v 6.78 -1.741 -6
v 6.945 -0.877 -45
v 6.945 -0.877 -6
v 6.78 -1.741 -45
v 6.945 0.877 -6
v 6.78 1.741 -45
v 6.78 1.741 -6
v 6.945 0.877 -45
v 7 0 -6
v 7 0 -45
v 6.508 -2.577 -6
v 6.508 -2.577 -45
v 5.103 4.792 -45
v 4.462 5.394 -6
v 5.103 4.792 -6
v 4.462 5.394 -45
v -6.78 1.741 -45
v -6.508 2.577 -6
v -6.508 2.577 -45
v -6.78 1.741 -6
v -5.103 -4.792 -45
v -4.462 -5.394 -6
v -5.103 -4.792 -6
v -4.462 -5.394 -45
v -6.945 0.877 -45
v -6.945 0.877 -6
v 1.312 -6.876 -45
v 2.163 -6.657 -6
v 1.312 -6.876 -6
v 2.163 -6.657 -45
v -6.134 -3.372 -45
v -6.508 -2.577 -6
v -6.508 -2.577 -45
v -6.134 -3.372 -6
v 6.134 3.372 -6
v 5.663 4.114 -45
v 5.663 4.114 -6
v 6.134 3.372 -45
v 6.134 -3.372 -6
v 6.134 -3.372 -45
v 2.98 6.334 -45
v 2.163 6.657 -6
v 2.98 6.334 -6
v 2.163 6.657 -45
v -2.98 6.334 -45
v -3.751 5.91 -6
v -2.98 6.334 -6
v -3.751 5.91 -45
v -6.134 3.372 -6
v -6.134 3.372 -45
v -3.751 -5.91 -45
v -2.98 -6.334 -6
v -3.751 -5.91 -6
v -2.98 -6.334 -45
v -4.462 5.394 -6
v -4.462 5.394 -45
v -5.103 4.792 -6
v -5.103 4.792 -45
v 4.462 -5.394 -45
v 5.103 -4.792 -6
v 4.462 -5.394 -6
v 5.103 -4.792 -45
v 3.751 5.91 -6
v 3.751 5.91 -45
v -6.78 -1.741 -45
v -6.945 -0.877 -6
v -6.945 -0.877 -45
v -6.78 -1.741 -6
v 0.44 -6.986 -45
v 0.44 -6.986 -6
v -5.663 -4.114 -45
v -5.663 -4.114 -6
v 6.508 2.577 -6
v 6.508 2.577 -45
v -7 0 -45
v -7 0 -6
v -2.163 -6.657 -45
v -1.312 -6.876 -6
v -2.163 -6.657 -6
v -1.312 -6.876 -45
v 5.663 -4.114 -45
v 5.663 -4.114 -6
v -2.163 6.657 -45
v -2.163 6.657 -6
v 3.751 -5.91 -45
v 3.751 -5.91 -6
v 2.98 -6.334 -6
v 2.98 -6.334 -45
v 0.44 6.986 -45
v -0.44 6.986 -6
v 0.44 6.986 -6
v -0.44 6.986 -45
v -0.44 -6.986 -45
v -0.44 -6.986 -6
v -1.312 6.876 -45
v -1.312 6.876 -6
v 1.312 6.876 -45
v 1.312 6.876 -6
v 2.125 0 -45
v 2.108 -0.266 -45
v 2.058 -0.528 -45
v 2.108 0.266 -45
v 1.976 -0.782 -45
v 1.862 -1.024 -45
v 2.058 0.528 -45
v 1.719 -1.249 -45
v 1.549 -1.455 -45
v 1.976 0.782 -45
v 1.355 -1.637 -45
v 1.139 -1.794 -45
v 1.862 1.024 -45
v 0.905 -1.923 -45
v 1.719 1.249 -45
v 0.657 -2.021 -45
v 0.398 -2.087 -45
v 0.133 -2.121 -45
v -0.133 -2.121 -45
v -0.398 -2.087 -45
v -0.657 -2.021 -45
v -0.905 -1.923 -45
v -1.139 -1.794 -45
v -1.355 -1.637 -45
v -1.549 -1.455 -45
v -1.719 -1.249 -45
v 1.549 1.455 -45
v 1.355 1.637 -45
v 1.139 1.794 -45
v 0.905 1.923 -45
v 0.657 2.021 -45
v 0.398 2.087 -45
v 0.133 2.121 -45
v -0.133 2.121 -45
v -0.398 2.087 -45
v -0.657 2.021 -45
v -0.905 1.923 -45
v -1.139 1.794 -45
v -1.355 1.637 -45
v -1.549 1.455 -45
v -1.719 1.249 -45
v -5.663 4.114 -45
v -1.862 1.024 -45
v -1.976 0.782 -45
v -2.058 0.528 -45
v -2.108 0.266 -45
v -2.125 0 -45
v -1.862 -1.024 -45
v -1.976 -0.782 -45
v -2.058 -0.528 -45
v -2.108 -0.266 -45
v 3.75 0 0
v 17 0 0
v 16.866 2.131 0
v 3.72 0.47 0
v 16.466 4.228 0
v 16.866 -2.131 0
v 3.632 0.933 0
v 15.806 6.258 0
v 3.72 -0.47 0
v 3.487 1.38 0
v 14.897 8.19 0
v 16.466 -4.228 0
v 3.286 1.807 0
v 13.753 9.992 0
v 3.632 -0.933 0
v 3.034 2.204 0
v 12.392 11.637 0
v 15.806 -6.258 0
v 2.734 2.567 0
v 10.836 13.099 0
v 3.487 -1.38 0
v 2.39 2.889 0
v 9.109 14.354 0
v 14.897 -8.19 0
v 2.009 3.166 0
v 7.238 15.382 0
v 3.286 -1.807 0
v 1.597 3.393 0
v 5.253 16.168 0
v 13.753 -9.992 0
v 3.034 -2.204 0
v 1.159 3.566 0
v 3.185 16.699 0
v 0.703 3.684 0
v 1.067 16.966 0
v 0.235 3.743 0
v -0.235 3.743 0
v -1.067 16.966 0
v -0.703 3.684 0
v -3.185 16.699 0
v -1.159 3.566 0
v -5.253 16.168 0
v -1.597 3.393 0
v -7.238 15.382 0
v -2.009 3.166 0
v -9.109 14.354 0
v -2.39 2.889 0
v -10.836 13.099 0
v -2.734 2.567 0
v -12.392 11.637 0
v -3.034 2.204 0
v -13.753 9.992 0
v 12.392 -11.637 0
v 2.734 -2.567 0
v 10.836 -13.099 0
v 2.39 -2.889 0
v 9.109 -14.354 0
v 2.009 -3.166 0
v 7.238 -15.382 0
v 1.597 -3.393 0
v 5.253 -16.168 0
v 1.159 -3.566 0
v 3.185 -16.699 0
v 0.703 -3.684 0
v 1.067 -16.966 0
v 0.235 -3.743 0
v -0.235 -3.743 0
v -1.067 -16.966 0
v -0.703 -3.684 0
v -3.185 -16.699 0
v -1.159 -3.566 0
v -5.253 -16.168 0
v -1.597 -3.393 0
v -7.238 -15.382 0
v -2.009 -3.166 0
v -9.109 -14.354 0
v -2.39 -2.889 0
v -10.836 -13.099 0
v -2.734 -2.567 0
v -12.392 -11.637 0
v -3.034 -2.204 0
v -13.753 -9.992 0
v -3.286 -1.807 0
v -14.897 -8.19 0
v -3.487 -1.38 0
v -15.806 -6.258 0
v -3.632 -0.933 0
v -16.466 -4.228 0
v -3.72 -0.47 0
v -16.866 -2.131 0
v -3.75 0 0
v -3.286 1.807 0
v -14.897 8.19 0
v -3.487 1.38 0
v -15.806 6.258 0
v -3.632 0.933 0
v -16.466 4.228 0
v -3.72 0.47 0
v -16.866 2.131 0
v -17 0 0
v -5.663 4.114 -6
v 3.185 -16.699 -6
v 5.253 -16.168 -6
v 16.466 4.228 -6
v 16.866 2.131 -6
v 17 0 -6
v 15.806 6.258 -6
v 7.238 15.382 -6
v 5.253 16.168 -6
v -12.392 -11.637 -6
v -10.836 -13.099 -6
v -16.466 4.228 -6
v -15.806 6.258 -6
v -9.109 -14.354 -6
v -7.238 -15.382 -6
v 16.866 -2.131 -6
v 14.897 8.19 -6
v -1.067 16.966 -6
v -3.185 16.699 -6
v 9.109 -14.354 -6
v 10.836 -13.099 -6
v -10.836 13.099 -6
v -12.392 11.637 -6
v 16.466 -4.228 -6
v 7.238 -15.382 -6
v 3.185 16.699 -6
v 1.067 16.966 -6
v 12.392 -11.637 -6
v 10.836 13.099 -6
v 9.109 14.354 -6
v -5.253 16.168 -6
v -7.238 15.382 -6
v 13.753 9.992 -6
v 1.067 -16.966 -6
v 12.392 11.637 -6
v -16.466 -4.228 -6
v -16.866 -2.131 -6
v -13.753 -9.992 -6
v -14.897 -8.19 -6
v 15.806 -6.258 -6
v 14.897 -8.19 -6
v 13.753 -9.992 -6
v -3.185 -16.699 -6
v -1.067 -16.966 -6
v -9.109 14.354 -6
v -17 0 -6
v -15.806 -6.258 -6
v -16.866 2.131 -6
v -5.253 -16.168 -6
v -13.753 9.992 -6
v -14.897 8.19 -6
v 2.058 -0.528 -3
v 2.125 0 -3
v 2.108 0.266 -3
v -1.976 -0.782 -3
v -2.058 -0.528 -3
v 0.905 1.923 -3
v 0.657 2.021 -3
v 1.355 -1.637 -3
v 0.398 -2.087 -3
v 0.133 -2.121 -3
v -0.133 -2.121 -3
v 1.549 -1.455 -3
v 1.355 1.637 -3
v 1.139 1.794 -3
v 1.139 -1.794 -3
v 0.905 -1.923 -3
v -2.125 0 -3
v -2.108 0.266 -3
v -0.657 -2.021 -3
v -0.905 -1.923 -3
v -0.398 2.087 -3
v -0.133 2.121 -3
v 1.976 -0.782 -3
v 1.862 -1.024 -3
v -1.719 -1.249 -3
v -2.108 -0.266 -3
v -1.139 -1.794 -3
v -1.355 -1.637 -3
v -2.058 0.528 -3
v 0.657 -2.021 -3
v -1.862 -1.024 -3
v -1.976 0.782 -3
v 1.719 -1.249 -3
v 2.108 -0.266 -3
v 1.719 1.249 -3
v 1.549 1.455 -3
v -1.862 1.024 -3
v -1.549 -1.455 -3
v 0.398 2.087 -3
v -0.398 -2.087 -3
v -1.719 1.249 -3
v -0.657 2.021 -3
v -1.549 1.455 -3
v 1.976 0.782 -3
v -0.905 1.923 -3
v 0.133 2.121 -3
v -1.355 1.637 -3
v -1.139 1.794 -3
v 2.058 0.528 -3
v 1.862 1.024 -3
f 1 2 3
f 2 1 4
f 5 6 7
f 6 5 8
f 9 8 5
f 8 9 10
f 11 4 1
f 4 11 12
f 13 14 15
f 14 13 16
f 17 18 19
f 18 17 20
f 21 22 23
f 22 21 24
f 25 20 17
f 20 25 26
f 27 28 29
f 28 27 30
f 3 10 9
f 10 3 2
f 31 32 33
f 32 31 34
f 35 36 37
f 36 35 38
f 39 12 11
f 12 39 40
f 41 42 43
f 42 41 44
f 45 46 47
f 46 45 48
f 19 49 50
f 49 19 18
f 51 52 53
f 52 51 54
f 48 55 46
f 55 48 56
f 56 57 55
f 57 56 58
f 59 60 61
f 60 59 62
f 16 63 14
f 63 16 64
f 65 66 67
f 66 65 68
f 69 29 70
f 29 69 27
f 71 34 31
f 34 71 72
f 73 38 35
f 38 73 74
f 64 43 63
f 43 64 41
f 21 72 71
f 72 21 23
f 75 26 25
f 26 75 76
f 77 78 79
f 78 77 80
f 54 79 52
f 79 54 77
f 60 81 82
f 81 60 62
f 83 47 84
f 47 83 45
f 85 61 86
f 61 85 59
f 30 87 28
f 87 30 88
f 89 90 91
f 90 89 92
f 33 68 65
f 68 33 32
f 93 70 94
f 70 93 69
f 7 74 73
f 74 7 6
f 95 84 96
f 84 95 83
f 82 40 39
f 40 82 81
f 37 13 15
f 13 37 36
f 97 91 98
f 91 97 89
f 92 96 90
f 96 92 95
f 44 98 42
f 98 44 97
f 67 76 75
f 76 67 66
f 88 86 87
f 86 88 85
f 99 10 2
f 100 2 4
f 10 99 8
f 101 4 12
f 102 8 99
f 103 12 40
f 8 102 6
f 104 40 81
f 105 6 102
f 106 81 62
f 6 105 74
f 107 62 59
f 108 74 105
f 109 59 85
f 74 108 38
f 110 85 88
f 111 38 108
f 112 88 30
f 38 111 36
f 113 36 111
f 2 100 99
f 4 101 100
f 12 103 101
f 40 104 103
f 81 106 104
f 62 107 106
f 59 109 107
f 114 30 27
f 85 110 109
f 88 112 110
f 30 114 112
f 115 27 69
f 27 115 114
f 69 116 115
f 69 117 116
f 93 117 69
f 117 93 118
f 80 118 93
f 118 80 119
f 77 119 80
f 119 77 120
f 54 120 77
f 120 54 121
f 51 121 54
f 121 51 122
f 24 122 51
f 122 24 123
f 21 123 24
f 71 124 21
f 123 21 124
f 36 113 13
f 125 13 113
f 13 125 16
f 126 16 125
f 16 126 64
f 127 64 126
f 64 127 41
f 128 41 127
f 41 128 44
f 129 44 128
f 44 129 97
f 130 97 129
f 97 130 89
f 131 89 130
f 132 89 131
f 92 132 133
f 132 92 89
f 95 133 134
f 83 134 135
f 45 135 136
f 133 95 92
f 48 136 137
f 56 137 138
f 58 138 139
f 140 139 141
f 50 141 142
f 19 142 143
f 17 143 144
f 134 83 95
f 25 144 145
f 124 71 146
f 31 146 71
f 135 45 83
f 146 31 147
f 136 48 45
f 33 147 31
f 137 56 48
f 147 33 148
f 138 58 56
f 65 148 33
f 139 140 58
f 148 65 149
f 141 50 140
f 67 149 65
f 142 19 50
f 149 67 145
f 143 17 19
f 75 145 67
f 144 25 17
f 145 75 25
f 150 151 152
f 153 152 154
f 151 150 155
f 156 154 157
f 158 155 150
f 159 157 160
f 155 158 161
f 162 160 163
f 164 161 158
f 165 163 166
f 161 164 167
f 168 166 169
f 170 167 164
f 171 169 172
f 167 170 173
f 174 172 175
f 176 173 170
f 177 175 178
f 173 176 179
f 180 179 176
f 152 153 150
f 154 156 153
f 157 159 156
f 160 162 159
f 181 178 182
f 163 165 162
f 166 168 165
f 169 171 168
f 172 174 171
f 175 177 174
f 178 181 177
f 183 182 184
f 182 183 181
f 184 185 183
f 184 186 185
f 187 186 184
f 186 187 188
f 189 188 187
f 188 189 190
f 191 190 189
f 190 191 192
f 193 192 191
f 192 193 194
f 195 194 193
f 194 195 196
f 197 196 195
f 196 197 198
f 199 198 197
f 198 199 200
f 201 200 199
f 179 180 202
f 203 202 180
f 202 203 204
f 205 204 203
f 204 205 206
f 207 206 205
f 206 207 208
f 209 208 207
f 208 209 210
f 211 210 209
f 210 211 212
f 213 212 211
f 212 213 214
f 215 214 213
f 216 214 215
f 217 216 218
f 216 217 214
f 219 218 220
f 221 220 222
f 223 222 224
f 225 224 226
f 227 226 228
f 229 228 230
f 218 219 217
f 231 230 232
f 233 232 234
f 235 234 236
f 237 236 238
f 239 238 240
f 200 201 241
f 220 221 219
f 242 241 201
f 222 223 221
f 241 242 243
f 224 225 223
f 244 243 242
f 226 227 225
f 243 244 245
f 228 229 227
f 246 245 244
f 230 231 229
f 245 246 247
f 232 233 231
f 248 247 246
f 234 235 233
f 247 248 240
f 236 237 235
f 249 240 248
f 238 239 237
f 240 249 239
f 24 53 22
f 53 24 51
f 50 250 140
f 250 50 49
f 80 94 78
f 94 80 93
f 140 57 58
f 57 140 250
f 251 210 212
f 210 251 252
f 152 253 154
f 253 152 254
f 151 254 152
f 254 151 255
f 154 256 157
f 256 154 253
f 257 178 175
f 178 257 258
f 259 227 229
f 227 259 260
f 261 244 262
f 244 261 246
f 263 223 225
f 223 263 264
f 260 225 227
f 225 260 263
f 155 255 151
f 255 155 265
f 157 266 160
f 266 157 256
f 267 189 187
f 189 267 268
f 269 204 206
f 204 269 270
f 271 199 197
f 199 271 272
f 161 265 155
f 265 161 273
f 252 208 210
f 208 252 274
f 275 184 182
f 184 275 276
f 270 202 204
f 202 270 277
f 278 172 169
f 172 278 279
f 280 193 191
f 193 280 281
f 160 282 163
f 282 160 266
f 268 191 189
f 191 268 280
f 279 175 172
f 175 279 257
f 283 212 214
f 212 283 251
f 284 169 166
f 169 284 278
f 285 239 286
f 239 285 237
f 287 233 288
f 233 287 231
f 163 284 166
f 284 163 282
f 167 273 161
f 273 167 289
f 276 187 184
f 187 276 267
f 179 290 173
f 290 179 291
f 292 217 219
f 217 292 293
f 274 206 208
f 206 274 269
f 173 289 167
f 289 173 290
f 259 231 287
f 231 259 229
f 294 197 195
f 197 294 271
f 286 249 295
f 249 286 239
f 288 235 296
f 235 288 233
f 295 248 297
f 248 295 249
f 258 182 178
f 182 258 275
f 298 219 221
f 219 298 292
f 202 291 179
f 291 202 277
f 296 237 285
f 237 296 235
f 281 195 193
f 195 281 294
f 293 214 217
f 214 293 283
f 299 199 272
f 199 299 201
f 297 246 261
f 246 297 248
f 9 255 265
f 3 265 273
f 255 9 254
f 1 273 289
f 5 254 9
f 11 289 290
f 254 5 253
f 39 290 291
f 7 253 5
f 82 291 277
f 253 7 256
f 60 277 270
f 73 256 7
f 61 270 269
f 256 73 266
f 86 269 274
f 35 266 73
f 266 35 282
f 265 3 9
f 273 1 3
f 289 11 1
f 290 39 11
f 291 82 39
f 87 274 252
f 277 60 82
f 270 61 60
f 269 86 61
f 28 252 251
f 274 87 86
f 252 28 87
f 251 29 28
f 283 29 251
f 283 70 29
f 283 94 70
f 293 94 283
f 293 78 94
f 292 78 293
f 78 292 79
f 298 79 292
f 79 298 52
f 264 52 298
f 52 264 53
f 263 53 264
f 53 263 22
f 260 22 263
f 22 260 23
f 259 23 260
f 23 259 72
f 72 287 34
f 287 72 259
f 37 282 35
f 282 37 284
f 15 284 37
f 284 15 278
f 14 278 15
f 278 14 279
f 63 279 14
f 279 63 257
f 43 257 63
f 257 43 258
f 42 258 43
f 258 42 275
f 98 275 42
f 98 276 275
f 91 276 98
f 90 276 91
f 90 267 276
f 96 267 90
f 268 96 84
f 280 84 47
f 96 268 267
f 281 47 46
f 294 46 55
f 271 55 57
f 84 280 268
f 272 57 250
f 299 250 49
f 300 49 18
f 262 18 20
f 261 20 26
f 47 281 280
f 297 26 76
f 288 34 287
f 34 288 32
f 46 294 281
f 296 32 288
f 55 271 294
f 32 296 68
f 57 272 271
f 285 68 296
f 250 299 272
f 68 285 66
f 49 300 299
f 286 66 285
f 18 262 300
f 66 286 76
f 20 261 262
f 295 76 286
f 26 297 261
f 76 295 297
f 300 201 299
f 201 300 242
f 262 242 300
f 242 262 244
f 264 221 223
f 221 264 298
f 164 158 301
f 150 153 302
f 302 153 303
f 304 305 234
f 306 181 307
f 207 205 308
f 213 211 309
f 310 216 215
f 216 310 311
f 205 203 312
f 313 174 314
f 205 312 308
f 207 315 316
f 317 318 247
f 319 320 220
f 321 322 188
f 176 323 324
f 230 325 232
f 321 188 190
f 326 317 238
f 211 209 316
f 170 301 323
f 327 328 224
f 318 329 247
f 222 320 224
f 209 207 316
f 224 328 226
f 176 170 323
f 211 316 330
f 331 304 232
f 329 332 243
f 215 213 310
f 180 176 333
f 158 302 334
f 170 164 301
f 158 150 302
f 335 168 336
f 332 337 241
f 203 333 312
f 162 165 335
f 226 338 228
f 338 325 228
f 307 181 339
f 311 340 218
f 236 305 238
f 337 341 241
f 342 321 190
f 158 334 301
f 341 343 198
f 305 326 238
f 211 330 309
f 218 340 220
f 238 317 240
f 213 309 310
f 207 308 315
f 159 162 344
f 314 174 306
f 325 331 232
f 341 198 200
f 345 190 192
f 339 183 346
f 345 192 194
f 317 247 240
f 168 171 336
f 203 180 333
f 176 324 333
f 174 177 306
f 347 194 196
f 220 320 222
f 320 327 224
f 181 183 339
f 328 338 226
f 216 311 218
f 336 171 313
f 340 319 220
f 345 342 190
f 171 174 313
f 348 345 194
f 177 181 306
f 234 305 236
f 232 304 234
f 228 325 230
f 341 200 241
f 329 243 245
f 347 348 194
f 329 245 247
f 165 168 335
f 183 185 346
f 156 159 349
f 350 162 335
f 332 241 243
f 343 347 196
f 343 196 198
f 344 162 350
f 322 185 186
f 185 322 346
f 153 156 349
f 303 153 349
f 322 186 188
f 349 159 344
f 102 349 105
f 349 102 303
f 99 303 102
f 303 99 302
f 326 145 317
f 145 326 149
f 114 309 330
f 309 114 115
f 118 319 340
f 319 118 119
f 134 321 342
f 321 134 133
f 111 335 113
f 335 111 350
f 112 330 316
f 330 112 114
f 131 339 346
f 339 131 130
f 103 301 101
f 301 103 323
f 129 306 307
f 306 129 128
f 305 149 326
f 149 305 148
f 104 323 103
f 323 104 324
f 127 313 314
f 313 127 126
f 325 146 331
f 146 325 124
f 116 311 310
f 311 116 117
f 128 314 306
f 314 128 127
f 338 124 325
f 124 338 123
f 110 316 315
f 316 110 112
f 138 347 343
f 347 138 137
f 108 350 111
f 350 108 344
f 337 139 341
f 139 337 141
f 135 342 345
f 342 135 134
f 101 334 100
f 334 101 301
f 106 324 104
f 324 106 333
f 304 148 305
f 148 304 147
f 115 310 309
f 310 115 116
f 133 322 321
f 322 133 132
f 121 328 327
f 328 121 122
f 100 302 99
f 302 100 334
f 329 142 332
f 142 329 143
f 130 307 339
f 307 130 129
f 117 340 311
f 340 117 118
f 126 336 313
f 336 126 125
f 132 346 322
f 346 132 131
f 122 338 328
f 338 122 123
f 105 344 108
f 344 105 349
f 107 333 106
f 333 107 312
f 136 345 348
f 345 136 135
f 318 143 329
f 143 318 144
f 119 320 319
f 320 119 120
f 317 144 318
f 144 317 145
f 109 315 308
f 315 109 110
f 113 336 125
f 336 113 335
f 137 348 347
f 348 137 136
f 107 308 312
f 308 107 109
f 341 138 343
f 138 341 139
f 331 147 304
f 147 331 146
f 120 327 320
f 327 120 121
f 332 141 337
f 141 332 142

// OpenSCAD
$fn = 50;


difference() {
	union() {
		translate(v = [0, 0, -45.0000000000]) {
			cylinder(h = 45, r = 7.0000000000);
		}
		translate(v = [0, 0, -6.0000000000]) {
			cylinder(h = 6, r = 17.0000000000);
		}
	}
	union() {
		translate(v = [0, 0, 0]) {
			rotate(a = [0, 0, 0]) {
				difference() {
					union() {
						#translate(v = [0, 0, -45.0000000000]) {
							cylinder(h = 45, r = 2.0000000000);
						}
						#translate(v = [0, 0, -3]) {
							cylinder(h = 3, r = 7.0000000000, r1 = 2.1250000000, r2 = 3.7500000000);
						}
						#translate(v = [0, 0, -45.0000000000]) {
							cylinder(h = 45, r = 2.1250000000);
						}
						#translate(v = [0, 0, -45.0000000000]) {
							cylinder(h = 45, r = 2.0000000000);
						}
					}
					union();
				}
			}
		}
	}
}
